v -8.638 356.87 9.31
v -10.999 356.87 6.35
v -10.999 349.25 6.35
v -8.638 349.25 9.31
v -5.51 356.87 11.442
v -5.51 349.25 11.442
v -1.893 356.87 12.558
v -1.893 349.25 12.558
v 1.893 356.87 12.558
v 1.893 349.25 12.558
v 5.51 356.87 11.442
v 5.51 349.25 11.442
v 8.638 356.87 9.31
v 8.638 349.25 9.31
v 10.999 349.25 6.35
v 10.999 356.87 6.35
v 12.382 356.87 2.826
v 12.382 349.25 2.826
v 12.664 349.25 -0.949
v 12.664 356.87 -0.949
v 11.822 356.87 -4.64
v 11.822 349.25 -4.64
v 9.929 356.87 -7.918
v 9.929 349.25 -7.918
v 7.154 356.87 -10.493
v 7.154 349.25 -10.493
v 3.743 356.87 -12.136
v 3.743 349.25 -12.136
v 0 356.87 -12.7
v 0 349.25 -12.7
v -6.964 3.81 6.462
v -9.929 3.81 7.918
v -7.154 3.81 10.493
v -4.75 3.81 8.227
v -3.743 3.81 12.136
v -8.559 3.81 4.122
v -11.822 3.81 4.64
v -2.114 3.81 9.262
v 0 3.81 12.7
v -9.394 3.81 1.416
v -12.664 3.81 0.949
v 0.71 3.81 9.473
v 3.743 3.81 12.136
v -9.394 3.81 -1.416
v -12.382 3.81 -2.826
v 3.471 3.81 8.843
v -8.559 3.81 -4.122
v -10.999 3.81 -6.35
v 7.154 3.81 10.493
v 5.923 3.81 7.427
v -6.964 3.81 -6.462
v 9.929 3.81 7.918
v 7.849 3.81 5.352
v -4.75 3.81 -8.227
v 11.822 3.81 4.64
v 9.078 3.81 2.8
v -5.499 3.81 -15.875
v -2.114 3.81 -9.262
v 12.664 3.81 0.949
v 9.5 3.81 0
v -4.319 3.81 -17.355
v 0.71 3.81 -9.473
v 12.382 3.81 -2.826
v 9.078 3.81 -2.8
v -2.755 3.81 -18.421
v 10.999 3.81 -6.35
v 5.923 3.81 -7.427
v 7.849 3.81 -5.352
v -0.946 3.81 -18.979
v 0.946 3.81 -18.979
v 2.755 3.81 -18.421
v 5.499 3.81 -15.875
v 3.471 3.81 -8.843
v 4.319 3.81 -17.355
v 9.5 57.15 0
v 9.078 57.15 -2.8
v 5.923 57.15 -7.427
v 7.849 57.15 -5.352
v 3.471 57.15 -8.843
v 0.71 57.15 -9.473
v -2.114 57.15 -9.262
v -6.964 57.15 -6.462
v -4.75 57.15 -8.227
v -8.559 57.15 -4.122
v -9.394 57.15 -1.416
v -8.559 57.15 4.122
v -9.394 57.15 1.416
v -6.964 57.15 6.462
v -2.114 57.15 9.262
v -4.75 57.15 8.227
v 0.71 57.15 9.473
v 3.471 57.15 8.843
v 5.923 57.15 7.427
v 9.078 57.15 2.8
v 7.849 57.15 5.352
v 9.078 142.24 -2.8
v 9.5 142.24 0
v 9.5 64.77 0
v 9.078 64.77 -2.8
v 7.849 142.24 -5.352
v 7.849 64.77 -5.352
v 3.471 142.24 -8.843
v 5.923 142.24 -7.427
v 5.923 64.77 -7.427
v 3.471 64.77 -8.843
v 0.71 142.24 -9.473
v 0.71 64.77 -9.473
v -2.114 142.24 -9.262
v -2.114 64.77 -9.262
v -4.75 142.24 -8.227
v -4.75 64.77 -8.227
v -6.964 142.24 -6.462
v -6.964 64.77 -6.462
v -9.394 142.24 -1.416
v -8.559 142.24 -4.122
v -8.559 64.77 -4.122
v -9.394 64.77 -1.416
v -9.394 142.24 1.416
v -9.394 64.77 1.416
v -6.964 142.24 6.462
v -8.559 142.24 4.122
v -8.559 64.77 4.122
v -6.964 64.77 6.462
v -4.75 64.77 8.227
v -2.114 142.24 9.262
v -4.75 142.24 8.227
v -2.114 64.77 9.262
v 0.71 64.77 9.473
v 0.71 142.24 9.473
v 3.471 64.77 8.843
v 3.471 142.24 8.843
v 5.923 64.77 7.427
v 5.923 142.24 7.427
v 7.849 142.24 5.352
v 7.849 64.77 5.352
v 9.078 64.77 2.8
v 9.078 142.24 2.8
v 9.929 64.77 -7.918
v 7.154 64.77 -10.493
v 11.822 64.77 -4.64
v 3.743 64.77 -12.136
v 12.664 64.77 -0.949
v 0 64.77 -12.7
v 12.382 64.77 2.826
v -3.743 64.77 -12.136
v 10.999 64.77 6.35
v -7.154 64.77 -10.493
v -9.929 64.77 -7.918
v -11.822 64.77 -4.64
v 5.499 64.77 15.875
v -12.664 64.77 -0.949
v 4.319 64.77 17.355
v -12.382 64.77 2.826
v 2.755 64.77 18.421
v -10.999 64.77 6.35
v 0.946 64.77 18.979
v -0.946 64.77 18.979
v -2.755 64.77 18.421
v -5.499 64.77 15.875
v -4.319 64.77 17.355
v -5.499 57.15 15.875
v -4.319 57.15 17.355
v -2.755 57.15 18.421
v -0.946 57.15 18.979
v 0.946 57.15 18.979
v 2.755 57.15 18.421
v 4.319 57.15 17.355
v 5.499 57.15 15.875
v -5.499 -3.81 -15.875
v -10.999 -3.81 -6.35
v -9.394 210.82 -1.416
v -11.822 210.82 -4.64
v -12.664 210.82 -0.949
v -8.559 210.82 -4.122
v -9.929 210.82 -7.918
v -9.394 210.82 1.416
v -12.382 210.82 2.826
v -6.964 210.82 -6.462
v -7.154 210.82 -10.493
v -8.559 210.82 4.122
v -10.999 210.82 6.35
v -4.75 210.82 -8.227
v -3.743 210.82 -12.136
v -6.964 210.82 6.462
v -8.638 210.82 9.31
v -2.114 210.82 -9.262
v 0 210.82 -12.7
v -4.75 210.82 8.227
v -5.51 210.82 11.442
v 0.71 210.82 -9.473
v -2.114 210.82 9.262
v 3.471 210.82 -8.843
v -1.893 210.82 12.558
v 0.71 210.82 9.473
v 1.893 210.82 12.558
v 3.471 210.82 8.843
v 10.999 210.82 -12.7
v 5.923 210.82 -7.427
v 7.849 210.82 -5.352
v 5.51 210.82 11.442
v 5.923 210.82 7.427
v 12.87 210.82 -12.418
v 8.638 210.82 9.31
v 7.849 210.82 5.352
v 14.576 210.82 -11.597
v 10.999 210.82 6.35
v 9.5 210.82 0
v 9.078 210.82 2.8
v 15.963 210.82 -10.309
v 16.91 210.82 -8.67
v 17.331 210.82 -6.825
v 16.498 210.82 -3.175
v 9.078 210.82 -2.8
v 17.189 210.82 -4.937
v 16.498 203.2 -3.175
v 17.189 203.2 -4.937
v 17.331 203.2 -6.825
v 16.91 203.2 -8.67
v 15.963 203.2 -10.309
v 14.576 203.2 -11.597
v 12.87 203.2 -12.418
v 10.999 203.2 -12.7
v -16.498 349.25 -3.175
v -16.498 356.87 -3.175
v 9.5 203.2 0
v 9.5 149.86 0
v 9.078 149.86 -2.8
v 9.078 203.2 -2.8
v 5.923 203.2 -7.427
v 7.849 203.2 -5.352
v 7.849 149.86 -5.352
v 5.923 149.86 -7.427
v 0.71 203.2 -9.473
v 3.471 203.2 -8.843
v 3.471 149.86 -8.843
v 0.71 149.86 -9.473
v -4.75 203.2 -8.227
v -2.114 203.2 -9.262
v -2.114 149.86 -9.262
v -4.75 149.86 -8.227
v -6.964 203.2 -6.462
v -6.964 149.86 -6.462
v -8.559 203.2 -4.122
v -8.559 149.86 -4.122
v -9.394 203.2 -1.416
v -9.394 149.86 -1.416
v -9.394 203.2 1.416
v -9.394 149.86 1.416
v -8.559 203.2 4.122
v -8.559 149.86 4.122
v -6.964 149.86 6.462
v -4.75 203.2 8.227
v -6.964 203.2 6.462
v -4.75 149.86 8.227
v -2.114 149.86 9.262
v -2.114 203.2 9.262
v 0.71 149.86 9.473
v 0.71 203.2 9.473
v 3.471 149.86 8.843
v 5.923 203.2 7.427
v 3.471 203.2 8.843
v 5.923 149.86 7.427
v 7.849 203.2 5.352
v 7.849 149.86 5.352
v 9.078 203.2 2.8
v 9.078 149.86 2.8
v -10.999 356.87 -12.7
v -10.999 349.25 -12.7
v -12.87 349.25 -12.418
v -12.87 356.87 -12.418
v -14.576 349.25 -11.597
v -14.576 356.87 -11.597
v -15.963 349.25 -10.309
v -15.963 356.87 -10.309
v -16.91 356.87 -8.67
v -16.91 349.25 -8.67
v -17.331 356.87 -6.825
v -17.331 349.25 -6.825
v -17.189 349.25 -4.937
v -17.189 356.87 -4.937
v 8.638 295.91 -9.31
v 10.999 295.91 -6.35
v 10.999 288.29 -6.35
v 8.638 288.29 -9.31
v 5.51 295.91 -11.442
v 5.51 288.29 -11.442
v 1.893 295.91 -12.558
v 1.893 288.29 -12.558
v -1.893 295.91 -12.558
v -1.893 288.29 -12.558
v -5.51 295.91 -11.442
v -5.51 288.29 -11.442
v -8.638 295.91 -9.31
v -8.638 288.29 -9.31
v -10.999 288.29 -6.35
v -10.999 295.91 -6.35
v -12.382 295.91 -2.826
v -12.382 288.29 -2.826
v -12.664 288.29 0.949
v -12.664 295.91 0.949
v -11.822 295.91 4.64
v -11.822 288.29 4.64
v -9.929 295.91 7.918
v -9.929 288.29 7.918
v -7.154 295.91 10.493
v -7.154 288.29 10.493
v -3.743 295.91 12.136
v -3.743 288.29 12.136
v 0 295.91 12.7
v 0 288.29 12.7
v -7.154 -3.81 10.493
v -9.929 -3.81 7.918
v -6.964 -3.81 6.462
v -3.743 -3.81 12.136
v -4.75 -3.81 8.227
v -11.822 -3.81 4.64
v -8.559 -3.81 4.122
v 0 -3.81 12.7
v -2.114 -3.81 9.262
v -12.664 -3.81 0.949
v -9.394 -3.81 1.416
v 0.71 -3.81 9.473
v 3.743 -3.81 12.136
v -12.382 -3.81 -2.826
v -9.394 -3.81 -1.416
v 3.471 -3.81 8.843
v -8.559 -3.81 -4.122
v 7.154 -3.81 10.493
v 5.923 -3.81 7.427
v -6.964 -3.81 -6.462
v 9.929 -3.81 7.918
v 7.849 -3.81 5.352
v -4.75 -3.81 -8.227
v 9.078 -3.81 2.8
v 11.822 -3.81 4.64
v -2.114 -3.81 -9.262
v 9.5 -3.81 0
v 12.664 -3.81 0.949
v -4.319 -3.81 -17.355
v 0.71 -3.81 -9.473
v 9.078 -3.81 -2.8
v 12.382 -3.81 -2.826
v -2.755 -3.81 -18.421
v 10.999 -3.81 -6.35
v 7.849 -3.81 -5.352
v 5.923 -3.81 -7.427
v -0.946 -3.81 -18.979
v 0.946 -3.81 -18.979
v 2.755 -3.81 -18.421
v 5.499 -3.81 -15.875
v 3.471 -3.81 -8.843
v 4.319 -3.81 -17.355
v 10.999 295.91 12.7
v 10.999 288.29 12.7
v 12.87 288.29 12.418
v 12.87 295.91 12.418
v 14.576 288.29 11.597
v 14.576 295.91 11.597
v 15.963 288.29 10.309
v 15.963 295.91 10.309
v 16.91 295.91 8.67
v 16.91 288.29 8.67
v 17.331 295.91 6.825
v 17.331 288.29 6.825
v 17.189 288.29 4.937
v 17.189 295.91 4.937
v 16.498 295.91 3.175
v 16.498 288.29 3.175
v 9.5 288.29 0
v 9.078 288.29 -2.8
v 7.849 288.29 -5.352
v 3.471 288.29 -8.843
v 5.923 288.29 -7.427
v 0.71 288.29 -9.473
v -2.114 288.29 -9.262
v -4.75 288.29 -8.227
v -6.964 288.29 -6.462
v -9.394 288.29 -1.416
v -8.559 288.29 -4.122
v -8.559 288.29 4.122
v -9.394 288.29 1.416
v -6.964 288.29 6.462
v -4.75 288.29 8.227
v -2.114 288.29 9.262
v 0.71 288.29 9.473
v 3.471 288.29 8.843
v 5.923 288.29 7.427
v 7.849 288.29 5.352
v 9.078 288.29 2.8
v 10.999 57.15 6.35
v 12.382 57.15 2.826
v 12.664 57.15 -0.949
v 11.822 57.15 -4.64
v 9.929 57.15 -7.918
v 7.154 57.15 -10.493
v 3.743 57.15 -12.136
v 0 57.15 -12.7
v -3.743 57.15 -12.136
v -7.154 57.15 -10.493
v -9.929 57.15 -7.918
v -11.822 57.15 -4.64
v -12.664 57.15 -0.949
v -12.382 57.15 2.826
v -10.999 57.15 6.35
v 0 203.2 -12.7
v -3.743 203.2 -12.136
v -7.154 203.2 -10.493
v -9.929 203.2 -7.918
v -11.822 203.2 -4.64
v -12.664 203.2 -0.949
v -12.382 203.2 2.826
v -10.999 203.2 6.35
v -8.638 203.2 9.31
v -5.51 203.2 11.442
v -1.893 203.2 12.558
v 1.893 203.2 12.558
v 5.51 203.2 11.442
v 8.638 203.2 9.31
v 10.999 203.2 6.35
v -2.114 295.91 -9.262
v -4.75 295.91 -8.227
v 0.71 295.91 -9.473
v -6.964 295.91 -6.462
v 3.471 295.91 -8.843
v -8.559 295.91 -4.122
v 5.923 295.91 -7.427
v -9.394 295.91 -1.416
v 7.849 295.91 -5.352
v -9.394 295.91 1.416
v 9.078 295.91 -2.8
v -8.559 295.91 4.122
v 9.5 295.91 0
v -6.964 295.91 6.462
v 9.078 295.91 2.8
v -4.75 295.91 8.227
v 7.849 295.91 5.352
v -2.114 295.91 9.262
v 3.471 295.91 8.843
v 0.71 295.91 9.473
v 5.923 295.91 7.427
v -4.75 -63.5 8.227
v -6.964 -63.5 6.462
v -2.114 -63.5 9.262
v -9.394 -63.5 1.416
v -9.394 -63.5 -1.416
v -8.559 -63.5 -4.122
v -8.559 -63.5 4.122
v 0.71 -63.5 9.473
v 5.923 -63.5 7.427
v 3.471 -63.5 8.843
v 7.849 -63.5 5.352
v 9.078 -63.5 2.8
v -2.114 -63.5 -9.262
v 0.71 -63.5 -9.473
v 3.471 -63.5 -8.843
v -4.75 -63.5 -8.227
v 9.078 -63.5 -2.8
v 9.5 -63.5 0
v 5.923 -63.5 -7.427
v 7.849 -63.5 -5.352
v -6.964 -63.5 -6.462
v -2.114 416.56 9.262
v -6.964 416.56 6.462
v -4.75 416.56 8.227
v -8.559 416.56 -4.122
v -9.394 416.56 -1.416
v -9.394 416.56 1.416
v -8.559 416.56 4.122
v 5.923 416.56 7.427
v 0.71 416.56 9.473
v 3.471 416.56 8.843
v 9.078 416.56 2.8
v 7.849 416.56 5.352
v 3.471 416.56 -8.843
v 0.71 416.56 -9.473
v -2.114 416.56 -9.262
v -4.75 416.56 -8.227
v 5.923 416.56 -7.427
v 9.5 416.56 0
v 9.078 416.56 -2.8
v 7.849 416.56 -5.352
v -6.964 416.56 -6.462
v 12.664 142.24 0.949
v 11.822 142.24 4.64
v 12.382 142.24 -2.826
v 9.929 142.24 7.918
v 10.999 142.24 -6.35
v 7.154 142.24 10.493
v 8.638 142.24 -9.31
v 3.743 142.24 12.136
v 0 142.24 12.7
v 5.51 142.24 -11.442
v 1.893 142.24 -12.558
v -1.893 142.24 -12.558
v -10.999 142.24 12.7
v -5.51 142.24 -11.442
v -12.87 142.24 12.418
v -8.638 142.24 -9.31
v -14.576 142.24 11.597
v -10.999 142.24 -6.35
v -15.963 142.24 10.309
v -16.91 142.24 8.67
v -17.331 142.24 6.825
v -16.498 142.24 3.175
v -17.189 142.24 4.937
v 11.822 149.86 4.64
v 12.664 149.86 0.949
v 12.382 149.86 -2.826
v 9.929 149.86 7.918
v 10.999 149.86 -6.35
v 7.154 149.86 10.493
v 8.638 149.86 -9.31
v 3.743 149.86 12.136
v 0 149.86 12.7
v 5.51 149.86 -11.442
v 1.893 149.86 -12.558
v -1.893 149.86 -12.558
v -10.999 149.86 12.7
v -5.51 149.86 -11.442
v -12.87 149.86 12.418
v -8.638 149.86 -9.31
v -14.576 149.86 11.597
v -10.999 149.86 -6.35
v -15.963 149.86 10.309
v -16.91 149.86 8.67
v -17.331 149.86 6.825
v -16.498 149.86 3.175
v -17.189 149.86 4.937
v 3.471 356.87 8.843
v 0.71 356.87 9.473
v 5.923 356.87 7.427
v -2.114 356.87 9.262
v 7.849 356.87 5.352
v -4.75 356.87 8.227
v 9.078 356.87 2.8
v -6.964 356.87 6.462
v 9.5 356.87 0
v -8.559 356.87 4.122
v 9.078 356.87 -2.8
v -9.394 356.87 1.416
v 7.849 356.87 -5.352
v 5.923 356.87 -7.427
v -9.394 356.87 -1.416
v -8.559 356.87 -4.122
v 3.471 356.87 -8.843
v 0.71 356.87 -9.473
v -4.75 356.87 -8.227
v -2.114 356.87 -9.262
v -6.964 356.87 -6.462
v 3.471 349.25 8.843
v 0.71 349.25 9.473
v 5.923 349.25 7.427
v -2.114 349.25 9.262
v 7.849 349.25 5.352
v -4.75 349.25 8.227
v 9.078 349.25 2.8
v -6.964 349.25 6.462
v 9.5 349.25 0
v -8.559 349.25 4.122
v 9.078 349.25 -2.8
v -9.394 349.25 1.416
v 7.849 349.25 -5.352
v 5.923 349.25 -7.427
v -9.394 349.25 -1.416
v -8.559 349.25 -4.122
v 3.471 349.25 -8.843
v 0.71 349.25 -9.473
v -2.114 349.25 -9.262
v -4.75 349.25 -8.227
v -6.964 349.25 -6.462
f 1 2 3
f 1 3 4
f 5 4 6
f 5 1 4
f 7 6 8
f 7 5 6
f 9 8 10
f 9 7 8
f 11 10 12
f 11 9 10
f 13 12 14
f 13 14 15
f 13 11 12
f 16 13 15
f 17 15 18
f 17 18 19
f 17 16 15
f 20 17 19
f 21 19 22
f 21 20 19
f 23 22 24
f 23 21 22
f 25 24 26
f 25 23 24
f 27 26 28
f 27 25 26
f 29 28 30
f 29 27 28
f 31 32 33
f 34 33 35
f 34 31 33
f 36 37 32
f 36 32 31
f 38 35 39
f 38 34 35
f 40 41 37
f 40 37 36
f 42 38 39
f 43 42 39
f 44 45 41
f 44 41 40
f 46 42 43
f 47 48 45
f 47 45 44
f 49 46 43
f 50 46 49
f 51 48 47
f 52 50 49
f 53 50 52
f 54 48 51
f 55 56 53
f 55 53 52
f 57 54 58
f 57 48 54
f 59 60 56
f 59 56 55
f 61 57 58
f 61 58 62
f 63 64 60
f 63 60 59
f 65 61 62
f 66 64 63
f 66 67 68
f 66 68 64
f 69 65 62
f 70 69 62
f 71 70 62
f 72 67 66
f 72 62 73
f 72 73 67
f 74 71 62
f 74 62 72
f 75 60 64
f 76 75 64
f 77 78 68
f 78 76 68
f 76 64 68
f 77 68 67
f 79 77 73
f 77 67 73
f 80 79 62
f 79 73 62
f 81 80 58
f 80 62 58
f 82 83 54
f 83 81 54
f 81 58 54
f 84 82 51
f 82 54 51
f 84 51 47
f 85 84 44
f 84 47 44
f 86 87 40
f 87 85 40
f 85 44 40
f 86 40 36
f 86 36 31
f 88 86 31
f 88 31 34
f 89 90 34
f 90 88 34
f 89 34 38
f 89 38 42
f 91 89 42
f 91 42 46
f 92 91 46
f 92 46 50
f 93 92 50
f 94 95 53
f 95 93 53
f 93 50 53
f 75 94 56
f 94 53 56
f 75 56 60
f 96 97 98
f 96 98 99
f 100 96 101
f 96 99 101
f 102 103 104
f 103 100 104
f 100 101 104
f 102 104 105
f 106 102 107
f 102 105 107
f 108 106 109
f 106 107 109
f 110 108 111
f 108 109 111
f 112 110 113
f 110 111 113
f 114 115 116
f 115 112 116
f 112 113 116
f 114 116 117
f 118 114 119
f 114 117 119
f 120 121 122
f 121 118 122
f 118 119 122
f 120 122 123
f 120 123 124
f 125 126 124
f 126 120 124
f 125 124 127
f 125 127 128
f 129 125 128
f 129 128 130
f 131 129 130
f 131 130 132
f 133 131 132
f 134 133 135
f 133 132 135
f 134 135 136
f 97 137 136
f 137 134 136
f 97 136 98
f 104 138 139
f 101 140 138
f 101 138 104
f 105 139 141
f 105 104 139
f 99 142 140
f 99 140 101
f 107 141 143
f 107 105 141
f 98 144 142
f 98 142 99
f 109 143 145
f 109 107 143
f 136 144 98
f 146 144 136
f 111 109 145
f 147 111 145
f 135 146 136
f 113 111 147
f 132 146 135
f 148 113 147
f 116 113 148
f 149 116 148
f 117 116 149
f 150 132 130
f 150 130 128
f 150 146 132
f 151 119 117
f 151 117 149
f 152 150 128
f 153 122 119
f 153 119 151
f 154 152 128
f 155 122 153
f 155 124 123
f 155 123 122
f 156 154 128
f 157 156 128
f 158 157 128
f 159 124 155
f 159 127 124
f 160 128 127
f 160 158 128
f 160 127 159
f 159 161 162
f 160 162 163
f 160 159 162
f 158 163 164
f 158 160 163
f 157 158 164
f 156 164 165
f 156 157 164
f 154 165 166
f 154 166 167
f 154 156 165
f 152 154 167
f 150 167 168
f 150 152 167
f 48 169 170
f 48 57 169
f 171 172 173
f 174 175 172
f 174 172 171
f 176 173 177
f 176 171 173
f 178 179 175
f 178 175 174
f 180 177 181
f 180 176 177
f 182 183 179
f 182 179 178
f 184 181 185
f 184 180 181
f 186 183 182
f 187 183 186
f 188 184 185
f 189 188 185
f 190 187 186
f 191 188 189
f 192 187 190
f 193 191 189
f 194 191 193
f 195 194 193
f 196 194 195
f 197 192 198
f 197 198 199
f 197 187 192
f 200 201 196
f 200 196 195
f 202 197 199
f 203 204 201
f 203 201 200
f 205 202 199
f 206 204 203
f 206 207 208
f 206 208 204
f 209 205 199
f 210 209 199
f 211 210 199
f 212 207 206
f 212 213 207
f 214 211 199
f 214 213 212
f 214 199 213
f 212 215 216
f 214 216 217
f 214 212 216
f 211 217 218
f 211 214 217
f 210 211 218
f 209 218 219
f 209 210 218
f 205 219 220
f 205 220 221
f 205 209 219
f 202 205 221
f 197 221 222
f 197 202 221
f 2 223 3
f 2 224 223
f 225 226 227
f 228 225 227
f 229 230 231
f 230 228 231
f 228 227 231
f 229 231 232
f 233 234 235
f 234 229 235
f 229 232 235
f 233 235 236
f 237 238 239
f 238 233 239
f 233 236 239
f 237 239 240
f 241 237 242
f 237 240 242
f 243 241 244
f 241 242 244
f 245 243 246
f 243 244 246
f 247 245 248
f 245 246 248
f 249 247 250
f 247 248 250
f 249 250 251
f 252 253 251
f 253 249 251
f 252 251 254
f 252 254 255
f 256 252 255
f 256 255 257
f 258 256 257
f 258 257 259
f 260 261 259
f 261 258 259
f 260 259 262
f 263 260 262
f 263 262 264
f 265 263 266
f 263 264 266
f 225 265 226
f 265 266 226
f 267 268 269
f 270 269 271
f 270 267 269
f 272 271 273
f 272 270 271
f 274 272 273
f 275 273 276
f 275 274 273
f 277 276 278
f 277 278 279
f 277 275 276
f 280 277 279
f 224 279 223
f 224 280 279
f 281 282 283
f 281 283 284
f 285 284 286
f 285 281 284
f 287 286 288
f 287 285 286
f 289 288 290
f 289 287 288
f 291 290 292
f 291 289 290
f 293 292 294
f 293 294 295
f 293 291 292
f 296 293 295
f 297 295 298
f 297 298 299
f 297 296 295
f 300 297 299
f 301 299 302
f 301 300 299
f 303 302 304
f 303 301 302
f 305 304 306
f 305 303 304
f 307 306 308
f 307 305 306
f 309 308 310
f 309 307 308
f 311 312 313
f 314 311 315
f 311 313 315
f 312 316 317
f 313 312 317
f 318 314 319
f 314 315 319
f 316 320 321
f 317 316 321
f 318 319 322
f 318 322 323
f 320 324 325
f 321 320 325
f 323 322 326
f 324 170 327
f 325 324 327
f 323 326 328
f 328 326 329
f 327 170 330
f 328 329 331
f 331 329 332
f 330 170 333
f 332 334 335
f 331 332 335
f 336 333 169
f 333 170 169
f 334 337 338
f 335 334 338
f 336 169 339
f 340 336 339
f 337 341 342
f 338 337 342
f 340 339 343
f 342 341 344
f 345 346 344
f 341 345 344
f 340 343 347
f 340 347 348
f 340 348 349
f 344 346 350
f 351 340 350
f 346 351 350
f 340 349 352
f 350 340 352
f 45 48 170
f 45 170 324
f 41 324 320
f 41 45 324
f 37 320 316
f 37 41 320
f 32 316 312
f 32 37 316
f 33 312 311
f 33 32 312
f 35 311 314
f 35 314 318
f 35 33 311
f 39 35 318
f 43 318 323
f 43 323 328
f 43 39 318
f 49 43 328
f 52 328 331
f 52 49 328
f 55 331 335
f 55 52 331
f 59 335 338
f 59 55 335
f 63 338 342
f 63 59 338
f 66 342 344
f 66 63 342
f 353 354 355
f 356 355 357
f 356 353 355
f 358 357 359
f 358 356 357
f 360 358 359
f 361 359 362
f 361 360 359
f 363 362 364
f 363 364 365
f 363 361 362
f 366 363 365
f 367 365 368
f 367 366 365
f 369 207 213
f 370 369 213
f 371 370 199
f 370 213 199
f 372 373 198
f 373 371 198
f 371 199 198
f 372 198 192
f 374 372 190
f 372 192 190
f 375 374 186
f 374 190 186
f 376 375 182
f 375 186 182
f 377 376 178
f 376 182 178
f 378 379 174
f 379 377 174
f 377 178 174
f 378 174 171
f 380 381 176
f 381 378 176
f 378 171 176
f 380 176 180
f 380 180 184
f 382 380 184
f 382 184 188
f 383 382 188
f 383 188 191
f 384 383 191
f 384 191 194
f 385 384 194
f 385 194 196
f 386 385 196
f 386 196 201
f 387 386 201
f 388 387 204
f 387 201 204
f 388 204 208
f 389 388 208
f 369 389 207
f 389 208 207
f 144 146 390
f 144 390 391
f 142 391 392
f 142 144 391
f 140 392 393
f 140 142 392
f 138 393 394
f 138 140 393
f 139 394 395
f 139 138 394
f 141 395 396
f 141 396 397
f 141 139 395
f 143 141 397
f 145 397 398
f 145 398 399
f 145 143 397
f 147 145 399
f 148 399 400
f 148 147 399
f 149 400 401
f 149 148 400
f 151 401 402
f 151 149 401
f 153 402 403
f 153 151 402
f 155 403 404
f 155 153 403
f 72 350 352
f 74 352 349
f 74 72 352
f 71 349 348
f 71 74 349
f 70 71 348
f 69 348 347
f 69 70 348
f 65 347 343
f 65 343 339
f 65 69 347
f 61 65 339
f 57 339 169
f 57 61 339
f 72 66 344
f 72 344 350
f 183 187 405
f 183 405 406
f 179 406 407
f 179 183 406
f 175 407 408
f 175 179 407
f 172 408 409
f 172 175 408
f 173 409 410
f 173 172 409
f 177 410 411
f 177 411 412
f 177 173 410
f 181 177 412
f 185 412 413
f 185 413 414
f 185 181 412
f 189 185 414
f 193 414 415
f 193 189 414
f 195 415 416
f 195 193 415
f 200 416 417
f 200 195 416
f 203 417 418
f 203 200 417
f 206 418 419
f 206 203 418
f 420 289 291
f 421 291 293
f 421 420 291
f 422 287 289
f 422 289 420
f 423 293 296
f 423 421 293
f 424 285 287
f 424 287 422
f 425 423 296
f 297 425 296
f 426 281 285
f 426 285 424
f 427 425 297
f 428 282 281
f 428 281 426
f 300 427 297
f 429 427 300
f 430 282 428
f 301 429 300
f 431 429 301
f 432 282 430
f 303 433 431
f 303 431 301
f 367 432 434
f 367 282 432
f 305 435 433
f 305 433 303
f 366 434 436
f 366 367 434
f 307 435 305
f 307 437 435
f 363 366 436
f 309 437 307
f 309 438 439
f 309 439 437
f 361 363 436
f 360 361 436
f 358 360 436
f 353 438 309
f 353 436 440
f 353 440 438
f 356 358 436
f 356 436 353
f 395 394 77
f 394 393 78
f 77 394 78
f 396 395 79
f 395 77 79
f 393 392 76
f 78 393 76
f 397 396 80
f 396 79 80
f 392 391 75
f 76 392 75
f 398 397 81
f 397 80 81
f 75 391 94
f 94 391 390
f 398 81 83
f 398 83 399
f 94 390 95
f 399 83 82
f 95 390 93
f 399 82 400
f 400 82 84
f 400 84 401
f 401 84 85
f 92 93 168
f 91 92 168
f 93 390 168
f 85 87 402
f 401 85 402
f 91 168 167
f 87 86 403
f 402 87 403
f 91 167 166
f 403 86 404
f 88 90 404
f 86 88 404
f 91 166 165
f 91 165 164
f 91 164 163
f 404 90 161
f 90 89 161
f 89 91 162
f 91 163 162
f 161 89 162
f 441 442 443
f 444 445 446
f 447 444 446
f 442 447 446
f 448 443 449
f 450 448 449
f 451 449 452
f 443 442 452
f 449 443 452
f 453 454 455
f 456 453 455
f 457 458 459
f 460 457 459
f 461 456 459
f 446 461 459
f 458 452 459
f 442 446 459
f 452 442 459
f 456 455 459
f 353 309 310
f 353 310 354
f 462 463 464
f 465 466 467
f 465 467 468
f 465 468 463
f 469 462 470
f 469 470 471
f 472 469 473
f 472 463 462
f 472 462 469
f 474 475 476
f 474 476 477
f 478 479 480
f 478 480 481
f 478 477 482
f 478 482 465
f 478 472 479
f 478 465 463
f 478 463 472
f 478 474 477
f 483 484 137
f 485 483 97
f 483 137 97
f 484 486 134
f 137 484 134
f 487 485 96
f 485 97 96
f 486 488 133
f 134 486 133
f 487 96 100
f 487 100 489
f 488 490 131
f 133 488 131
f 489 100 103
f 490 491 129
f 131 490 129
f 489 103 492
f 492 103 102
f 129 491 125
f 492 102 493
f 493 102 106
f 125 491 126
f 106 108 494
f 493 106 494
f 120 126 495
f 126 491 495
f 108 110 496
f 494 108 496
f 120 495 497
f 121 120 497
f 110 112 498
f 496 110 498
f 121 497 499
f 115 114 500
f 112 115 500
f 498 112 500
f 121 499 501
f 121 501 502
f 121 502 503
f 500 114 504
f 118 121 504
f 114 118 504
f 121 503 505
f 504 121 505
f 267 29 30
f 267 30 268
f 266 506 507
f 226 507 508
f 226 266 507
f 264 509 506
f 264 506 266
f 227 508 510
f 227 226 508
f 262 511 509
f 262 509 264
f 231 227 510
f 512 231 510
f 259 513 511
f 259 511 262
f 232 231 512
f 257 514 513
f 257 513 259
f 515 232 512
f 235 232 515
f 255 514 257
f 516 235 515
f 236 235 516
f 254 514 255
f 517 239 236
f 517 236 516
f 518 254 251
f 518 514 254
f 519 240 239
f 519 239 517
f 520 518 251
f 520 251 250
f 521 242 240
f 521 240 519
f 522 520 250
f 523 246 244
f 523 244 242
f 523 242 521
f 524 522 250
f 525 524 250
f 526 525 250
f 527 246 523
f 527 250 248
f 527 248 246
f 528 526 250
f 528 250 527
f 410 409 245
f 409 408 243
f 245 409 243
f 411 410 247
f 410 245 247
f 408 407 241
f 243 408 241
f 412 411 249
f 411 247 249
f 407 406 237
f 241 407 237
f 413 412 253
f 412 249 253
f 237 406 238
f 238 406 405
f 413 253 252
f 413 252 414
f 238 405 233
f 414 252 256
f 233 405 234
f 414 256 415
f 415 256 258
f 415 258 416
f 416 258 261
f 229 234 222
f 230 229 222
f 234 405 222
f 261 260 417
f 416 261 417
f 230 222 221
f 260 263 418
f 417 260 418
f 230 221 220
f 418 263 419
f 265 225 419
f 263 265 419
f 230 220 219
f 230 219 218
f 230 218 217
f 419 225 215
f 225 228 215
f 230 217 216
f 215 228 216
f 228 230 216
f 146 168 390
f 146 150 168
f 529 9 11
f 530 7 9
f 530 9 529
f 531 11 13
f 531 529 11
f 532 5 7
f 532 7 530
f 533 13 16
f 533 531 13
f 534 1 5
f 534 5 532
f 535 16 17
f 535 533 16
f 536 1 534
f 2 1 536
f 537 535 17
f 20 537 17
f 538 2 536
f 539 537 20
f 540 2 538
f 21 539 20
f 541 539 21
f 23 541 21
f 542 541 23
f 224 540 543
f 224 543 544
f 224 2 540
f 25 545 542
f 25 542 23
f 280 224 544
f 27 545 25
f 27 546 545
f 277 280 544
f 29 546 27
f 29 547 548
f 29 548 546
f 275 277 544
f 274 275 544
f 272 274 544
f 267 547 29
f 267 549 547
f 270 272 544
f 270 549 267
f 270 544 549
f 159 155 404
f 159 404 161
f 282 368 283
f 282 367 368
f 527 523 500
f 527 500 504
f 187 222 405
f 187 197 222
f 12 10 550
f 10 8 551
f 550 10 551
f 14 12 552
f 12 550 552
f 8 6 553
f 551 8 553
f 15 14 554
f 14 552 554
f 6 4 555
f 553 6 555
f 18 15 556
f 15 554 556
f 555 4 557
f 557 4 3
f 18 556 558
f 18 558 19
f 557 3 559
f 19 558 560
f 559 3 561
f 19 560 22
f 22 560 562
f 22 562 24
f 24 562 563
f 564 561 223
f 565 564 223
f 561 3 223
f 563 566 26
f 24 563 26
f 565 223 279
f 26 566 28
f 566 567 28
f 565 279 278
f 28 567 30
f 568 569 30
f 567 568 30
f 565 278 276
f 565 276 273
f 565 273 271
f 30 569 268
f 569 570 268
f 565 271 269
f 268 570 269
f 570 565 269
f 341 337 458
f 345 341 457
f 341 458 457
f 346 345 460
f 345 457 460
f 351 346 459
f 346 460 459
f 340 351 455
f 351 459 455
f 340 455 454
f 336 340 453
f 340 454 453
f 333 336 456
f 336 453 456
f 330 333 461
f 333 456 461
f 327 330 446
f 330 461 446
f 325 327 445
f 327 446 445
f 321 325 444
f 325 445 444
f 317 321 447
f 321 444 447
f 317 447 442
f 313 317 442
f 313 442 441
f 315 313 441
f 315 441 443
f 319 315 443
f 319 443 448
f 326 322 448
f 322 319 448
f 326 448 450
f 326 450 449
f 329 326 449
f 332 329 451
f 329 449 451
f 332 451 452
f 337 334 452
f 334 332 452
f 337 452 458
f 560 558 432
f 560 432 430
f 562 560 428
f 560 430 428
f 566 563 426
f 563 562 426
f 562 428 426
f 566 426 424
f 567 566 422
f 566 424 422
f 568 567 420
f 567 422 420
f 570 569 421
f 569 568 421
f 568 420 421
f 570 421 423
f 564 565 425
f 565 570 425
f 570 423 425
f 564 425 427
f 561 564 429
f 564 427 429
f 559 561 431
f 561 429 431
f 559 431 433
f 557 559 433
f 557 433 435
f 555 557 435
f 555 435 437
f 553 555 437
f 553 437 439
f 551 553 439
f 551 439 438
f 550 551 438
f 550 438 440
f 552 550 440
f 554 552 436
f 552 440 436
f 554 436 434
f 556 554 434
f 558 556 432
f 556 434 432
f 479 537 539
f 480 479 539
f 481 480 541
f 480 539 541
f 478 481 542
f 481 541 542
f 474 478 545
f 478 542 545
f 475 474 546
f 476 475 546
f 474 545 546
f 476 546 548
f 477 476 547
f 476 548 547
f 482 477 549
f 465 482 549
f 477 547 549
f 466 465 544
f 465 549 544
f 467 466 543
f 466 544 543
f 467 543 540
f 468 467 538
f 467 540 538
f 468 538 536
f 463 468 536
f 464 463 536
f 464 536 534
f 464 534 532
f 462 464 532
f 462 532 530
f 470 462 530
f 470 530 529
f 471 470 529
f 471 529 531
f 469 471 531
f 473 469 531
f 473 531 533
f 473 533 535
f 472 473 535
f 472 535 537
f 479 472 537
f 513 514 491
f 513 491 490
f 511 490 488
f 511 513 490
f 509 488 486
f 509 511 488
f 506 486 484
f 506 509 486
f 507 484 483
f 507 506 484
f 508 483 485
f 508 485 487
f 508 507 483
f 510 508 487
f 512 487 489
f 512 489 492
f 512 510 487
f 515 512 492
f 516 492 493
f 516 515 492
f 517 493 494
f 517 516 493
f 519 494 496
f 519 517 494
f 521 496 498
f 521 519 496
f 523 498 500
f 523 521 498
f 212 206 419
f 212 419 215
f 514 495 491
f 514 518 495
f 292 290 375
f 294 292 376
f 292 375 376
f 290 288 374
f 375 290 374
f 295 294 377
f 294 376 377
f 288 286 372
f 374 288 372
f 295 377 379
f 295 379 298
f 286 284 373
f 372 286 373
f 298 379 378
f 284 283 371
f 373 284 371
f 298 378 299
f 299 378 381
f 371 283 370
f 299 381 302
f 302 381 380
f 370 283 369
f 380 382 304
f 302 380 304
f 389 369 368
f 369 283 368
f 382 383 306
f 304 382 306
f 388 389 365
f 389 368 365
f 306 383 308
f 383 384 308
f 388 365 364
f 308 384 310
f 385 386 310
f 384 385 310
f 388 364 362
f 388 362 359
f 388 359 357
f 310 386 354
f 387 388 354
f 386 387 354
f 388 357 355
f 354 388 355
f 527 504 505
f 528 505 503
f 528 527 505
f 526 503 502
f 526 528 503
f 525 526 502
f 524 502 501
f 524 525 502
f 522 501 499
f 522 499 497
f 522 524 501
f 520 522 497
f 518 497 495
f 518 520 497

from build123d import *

# Parameters (mm, degrees)
BOSS_EXTRUDE1_DEPTH   = 3.81
LPATTERN1_COUNT       = 2
LPATTERN1_PITCH       = 60.96
BODY_MOVE_COPY1_ANGLE = 180
LPATTERN2_COUNT       = 3
LPATTERN2_PITCH       = 146.05
BODY_MOVE_COPY2_ANGLE = 120
BODY_MOVE_COPY3_ANGLE = 120
BOSS_EXTRUDE2_START   = -63.5
SKETCH2_R             = 9.5
BOSS_EXTRUDE2_DEPTH   = 480.06


with BuildPart() as part:
    # Sketch1 → Boss-Extrude1 (new, symmetric)
    with BuildSketch(Plane(origin=(0, 0, 0), x_dir=(1, 0, 0), z_dir=(0, 1, 0))):
        with BuildLine():
            Line((-5.499261314, 15.875), (-10.998522628, 6.35))
            ThreePointArc((-10.998522628, 6.35), (0, -12.7), (10.998522628, 6.35))
            Line((10.998522628, 6.35), (5.499261314, 15.875))
            ThreePointArc((5.499261314, 15.875), (0, 19.05), (-5.499261314, 15.875))
        make_face()
    extrude(amount=BOSS_EXTRUDE1_DEPTH, both=True)


with BuildPart() as lpattern1_1:
    # LPattern1: pattern copy
    add(part.part.moved(Location(Vector(0, 1, 0) * (1 * LPATTERN1_PITCH))))


with BuildPart() as lpattern1_1_1:
    # Body-Move/Copy1: moved
    add(lpattern1_1.part.rotate(Axis((0, 0, 0), (0, 1, 0)), BODY_MOVE_COPY1_ANGLE))


with BuildPart() as lpattern2_1:
    # LPattern2: pattern copy
    add(part.part.moved(Location(Vector(0, 1, 0) * (1 * LPATTERN2_PITCH))))


with BuildPart() as lpattern2_2:
    # LPattern2: pattern copy
    add(part.part.moved(Location(Vector(0, 1, 0) * (2 * LPATTERN2_PITCH))))


with BuildPart() as lpattern2_3:
    # LPattern2: pattern copy
    add(lpattern1_1_1.part.moved(Location(Vector(0, 1, 0) * (1 * LPATTERN2_PITCH))))


with BuildPart() as lpattern2_4:
    # LPattern2: pattern copy
    add(lpattern1_1_1.part.moved(Location(Vector(0, 1, 0) * (2 * LPATTERN2_PITCH))))


with BuildPart() as lpattern2_3_1:
    # Body-Move/Copy2: moved
    add(lpattern2_3.part.rotate(Axis((0, 0, 0), (0, 1, 0)), BODY_MOVE_COPY2_ANGLE))


with BuildPart() as lpattern2_1_1:
    # Body-Move/Copy2: moved
    add(lpattern2_1.part.rotate(Axis((0, 0, 0), (0, 1, 0)), BODY_MOVE_COPY2_ANGLE))


with BuildPart() as lpattern2_4_1:
    # Body-Move/Copy3: moved
    add(lpattern2_4.part.rotate(Axis((0, 0, 0), (0, -1, 0)), BODY_MOVE_COPY3_ANGLE))


with BuildPart() as lpattern2_2_1:
    # Body-Move/Copy3: moved
    add(lpattern2_2.part.rotate(Axis((0, 0, 0), (0, -1, 0)), BODY_MOVE_COPY3_ANGLE))


with BuildPart() as part_1:
    add(part.part)

    # Sketch2 → Boss-Extrude2 (add)
    with BuildSketch(Plane(origin=(0, 0, 0), x_dir=(1, 0, 0), z_dir=(0, 1, 0)).offset(BOSS_EXTRUDE2_START)):
        Circle(SKETCH2_R)
    extrude(amount=BOSS_EXTRUDE2_DEPTH)


with BuildPart() as lpattern1_1_2:
    add(lpattern1_1_1.part)

    # Combine1: union LPattern2_3, LPattern2_1, LPattern2_4, LPattern2_2, part
    add(lpattern2_3_1.part)
    add(lpattern2_1_1.part)
    add(lpattern2_4_1.part)
    add(lpattern2_2_1.part)
    add(part_1.part)


solid = lpattern1_1_2.part
